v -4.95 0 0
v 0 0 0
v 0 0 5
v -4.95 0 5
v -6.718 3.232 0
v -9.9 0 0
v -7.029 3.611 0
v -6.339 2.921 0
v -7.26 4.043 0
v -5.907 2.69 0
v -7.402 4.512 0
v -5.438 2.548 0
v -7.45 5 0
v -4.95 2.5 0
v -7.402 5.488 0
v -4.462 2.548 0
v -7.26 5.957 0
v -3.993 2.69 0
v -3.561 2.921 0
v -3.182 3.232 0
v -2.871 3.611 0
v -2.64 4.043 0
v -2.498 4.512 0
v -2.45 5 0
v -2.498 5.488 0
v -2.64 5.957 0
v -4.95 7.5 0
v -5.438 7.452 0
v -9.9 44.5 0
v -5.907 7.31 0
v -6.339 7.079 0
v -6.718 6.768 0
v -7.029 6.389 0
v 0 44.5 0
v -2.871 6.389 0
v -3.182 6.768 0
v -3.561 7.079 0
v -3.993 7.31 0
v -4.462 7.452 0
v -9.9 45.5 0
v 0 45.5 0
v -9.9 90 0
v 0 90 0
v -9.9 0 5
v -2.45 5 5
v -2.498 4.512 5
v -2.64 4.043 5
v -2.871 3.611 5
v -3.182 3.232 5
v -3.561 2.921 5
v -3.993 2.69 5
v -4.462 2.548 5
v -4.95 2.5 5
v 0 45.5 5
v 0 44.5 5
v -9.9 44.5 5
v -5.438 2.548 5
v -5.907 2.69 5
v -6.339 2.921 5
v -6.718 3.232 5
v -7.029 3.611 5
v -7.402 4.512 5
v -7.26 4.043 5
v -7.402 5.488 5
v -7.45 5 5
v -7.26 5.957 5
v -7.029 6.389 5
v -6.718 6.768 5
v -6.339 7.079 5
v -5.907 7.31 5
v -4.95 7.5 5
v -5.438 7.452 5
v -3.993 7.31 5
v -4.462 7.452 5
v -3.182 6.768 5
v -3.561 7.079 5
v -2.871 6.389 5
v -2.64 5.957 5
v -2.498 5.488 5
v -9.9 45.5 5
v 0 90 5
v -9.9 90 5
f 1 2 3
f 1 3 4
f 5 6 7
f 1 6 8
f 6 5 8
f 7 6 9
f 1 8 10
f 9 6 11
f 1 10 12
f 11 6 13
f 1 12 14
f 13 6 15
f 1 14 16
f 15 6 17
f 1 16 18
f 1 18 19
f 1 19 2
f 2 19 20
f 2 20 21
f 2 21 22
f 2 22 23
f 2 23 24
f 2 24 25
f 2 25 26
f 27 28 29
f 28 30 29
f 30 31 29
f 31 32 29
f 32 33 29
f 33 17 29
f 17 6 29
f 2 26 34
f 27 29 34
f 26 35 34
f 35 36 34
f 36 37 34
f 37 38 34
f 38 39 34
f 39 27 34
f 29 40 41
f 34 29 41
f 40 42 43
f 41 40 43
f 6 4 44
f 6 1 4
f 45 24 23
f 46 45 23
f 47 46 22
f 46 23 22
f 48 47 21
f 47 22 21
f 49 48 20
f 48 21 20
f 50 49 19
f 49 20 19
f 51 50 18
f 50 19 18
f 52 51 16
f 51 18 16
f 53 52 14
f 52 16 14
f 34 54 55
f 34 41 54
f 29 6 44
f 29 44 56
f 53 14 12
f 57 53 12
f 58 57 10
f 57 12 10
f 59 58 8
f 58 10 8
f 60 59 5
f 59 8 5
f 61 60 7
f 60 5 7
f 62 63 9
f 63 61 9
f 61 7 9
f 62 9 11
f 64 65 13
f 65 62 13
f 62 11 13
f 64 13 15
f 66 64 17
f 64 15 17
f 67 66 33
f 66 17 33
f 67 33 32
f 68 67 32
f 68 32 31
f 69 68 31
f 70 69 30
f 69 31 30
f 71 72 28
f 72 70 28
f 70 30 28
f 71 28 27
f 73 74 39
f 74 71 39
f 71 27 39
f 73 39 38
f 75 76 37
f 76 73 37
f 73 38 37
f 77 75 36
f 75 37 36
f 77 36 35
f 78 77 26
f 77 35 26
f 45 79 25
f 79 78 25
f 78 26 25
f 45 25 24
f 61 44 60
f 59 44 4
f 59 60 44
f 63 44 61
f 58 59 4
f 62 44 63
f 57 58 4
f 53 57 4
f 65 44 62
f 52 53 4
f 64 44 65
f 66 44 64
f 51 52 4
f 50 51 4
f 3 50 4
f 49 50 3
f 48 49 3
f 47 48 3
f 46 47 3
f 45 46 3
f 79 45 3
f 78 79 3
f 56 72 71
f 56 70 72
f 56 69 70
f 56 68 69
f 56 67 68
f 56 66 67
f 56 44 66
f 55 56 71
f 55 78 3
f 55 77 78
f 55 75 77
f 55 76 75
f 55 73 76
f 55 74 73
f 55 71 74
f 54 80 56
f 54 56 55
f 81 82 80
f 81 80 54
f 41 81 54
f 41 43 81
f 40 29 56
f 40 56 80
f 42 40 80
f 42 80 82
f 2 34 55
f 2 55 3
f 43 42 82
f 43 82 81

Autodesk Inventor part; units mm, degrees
ref_plane "YZ Plane" through (0, 0, 0) normal (1, 0, 0) x (0, 1, 0)
ref_plane "XZ Plane" through (0, 0, 0) normal (0, 1, 0) x (-1, 0, 0)
ref_plane "XY Plane" through (0, 0, 0) normal (0, 0, 1) x (1, 0, 0)
sketch "Sketch2" plane through (0, 0, 0) normal (0, 0, 1) x (1, 0, 0)
  line L0 (0, 0) -> (-9.9, 0)
  line L1 (-4.95, 0) -> (-4.95, 2.5)
  line L2 (-4.95, 0) -> (-2.45, 0) construction
  circle A0 centre (-4.95, 5) radius 2.5
  line L3 (-4.95, 7.5) -> (32.05, 7.5) construction
  line L4 (0, 44.5) -> (0, 0)
  line L5 (0, 0) -> (-9.9, 0)
  line L6 (-9.9, 0) -> (-9.9, 44.5)
  line L7 (0, 45.5) -> (0, 0)
  line L8 (0, 0) -> (-9.9, 0)
  line L9 (-9.9, 0) -> (-9.9, 45.5)
  line L10 (-4.95, 7.5) -> (66.05, 7.5) construction
  line L11 (0, 0) -> (-9.9, 0)
  line L12 (-9.9, 0) -> (-9.9, 90)
  line L13 (-9.9, 90) -> (0, 90)
  line L14 (0, 90) -> (0, 0)
  dimension "d35" = 5
  dimension "d33" = 2.5
  dimension "d34" = 90
  dimension "d46" = 9.9
  dimension "d47" = 90
extrude "Extrusion6" add sketch "Sketch2" along normal blind 5
properties part number "Elbow_Cube_Holder_TestFit_V2"
